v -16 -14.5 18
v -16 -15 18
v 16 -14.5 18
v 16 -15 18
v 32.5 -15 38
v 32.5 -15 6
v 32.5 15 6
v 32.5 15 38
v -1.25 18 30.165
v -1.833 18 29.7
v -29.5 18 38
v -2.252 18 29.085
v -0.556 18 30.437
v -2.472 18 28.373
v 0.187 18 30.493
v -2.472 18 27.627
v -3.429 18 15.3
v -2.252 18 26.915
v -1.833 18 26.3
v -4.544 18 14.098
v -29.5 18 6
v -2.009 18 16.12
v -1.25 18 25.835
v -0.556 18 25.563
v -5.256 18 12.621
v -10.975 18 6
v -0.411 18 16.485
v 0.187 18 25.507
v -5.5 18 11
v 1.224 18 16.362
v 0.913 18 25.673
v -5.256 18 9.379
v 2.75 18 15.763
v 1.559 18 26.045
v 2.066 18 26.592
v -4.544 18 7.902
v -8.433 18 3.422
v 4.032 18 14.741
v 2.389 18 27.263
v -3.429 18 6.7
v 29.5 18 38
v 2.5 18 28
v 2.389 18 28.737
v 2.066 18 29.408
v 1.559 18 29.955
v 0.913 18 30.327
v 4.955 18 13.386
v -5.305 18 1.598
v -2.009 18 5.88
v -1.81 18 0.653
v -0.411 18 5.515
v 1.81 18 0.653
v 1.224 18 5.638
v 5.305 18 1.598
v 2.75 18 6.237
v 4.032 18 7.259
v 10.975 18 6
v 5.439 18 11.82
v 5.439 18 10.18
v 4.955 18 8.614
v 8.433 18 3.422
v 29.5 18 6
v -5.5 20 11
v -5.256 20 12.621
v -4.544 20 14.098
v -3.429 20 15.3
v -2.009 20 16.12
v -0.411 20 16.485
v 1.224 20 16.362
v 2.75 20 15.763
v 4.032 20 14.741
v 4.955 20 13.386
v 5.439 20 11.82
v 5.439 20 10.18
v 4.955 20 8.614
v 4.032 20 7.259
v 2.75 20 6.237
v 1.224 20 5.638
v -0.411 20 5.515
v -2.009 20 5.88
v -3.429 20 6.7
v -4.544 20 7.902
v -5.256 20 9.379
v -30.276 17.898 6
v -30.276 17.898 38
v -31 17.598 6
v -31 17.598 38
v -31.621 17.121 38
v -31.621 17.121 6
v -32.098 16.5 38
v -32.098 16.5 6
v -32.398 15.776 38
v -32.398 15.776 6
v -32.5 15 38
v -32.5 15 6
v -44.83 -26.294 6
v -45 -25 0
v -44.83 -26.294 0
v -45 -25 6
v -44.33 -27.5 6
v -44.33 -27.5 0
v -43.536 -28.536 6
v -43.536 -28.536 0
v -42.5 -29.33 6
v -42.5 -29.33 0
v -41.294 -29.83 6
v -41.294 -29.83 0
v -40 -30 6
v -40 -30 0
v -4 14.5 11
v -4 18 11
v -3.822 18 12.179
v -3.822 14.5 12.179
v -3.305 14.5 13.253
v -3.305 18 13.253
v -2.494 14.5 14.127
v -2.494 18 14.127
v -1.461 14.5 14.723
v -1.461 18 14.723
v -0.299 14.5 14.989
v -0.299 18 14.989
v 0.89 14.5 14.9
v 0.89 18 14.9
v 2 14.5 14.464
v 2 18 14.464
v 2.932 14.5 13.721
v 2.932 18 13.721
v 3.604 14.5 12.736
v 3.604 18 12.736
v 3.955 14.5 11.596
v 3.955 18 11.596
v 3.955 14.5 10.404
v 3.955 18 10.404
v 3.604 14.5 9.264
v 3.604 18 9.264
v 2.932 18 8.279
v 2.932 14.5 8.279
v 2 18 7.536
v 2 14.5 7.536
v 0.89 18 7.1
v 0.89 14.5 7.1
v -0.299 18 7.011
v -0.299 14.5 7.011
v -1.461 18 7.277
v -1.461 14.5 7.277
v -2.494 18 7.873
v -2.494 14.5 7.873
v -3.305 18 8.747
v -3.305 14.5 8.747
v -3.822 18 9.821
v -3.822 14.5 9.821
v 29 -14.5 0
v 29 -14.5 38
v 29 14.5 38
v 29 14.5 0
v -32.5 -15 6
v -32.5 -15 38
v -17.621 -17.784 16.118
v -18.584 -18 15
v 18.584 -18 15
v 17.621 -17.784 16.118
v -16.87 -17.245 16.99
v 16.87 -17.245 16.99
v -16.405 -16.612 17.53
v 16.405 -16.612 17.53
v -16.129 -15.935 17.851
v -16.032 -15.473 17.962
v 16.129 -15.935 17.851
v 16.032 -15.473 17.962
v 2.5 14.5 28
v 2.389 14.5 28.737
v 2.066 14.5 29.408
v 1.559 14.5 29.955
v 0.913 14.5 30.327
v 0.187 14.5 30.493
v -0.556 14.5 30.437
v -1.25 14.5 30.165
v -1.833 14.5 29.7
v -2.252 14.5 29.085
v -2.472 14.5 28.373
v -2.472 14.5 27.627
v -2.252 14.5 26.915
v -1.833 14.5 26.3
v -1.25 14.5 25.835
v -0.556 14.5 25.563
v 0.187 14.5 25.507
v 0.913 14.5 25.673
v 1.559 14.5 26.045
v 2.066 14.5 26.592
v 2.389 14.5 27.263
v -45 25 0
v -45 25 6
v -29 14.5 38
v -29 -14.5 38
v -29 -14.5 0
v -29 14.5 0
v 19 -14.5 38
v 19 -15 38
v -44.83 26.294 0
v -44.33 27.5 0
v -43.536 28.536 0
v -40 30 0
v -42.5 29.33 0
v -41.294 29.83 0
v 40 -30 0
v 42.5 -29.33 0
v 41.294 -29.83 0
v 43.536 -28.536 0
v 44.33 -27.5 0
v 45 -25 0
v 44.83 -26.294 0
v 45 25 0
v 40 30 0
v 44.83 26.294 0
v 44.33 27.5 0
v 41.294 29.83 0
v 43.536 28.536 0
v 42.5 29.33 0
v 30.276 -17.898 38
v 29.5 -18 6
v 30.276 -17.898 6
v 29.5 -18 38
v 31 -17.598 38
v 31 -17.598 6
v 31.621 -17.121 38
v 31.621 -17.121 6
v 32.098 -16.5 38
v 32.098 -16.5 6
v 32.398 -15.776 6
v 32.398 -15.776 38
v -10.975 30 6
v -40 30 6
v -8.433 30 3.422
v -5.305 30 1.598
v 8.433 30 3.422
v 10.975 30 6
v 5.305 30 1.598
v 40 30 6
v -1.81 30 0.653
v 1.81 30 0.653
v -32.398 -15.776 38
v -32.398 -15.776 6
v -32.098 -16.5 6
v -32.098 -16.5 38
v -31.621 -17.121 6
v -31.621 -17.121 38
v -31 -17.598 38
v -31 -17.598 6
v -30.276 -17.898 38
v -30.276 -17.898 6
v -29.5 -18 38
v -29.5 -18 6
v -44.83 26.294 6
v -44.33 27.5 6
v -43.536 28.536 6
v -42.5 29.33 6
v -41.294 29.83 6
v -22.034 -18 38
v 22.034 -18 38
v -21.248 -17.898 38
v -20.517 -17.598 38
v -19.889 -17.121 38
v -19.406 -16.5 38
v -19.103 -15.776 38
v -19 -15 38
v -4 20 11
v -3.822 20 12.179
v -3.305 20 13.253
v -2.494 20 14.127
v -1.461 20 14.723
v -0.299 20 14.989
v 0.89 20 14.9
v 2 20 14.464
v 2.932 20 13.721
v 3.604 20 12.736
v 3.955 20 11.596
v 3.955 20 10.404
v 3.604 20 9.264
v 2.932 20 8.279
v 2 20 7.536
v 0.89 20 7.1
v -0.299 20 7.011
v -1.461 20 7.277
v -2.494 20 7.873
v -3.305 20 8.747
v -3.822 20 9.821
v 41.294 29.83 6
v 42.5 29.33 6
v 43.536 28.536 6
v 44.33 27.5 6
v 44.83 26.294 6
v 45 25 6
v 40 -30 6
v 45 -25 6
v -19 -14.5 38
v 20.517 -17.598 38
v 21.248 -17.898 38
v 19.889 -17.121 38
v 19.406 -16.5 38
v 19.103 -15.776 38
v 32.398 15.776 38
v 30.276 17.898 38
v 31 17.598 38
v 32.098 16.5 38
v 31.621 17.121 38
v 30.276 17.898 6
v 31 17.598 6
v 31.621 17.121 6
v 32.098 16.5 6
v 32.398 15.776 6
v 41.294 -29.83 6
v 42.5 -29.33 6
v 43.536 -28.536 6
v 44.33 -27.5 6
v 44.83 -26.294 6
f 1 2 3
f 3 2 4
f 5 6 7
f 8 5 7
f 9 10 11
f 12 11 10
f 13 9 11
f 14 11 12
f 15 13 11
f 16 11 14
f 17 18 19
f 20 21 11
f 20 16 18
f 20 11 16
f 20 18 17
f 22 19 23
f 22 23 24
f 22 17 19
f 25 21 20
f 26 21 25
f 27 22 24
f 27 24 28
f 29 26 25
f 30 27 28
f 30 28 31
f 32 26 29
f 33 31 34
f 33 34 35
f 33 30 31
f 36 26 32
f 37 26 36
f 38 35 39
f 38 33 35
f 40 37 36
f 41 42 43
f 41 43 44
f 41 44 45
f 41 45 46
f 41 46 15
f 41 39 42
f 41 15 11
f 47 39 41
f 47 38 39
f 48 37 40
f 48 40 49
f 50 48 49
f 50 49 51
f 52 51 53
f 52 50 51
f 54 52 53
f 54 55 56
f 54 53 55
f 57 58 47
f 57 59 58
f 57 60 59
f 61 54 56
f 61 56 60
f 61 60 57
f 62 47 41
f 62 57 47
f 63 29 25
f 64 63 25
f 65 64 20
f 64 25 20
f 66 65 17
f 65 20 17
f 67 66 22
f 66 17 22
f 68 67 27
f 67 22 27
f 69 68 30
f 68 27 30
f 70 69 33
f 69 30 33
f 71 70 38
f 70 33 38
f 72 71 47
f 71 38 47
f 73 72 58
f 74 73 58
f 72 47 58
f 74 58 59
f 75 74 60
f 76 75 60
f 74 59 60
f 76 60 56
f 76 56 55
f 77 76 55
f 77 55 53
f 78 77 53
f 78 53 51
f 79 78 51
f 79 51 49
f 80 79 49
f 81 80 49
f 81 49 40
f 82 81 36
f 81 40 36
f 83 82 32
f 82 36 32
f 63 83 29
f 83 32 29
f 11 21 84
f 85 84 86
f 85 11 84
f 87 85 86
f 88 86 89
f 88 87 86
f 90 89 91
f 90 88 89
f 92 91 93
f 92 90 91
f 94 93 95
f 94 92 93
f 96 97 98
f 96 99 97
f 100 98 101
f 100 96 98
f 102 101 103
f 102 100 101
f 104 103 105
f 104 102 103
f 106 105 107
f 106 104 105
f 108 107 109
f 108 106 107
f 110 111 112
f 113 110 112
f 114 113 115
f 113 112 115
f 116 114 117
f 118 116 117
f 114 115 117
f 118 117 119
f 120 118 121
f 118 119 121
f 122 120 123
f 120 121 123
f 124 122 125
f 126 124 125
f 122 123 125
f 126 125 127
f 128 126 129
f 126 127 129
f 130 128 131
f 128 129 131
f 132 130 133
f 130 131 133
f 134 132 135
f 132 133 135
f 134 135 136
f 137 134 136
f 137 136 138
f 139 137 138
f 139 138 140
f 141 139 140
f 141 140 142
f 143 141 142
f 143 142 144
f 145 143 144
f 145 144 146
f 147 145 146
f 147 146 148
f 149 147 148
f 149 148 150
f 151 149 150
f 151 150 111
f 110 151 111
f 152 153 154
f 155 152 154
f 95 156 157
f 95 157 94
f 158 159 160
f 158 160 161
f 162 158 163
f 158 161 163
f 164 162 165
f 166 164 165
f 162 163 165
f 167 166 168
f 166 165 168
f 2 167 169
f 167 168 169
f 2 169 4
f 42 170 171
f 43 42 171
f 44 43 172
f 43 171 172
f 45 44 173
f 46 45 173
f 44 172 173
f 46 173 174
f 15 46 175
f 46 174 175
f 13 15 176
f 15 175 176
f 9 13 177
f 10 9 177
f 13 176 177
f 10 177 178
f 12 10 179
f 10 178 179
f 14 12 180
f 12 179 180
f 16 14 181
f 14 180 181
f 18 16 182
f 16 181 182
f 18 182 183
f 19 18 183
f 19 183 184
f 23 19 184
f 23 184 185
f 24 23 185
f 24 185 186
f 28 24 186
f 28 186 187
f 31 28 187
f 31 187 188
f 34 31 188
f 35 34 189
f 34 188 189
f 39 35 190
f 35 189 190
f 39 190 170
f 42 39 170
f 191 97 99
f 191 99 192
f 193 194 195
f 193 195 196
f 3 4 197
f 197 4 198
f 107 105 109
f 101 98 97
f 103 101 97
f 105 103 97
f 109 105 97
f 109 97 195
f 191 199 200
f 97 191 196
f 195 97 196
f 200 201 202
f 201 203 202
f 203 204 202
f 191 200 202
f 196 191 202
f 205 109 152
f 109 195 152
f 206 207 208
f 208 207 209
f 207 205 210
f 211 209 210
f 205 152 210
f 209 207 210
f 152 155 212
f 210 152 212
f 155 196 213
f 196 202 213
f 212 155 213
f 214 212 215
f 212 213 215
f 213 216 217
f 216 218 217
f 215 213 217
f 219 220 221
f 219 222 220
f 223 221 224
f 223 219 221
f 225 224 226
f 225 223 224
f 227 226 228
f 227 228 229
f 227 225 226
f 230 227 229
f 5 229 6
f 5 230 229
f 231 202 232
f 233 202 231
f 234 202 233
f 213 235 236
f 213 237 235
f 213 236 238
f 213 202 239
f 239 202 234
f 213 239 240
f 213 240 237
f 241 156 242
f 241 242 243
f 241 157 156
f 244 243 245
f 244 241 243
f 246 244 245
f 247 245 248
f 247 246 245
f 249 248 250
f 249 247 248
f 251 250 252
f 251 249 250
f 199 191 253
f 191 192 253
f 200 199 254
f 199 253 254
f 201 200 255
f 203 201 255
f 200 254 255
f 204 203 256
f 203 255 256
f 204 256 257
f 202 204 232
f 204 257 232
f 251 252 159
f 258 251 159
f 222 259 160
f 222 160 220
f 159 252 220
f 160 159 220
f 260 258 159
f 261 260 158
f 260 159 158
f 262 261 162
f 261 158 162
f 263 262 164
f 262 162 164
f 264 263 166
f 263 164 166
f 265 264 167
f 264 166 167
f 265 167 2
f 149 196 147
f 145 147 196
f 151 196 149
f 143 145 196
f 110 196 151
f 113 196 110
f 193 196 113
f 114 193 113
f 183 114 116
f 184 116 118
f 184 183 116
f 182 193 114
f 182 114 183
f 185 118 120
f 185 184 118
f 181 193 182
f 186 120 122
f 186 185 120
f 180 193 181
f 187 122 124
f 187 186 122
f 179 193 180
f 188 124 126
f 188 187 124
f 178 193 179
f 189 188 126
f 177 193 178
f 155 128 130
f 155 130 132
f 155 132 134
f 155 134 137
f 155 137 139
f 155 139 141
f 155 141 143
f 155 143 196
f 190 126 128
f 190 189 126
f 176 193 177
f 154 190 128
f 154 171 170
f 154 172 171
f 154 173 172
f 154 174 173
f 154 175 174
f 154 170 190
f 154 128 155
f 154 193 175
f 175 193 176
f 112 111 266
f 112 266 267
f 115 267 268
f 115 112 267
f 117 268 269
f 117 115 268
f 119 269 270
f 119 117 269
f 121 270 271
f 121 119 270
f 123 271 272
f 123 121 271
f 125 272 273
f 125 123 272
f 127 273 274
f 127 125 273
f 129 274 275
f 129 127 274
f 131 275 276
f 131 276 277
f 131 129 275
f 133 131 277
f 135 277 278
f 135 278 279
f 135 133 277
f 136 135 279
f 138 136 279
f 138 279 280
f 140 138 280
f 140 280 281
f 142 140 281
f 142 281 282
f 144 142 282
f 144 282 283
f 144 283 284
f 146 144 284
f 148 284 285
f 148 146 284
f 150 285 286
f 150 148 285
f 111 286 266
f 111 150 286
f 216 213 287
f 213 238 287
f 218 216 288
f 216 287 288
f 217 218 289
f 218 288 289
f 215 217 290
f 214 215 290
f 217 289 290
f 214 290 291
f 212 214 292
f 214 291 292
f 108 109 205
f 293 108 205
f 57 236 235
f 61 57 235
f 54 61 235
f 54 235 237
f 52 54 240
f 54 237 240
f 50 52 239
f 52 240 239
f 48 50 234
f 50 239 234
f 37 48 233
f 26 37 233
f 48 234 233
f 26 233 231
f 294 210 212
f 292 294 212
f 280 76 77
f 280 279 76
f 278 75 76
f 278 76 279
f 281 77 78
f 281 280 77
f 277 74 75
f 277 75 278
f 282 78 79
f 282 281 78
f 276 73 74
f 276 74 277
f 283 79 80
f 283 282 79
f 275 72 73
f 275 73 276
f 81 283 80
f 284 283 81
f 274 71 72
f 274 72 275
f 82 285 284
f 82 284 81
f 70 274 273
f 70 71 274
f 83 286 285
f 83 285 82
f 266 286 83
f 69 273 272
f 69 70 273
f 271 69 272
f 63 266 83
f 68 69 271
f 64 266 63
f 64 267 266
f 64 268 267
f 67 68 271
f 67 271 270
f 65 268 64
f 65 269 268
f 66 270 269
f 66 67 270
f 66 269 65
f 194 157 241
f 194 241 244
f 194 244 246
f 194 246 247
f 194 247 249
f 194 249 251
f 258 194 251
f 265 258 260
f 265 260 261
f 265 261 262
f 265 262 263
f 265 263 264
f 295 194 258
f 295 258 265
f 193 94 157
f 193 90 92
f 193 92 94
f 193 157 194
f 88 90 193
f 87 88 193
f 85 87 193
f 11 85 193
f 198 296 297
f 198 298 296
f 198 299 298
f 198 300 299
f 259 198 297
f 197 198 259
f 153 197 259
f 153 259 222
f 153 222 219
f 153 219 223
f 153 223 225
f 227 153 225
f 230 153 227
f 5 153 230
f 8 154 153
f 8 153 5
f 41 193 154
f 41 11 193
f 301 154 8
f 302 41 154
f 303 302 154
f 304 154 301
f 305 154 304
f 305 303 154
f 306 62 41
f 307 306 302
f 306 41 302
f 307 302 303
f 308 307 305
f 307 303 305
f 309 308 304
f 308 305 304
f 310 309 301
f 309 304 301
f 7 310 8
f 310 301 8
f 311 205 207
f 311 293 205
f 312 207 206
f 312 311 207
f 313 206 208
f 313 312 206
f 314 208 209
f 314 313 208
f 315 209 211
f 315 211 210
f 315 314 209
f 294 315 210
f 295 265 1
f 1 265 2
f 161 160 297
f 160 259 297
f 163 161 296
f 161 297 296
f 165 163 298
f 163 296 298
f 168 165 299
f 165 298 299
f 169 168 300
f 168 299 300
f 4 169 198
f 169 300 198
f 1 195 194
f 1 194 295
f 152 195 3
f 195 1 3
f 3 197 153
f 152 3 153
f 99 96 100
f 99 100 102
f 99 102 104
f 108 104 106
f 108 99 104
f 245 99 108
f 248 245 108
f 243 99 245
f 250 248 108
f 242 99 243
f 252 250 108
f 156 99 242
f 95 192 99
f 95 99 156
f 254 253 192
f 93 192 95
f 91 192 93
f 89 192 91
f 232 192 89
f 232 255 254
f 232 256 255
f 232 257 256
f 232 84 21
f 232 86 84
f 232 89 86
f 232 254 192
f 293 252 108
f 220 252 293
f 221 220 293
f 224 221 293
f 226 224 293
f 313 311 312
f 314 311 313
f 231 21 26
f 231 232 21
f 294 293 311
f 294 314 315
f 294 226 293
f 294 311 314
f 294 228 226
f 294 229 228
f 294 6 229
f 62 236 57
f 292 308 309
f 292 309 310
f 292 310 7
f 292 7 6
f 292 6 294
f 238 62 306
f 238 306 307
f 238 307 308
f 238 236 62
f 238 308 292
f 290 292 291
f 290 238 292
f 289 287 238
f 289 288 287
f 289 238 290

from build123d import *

# Parameters (mm, degrees)
F0_W      = 90
F0_H      = 60
F1_DEPTH  = 6
F2_W      = 65
F2_H      = 36
F3_DEPTH  = 32
F4_W      = 58
F4_H      = 29
F5_DEPTH  = 38
F7_DEPTH  = 3.5
F8_R      = 2.5
F9_DEPTH  = 3.5
F11_DEPTH = 12
F12_R     = 5.5
F12_R_2   = 4
F13_DEPTH = 2
F14_DEPTH = 25
F15_R     = 5
F16_R     = 3


with BuildPart() as f1:
    # F0 (on Top) → F1 (new body)
    with BuildSketch(Plane.XY):
        Rectangle(F0_W, F0_H)
    extrude(amount=F1_DEPTH)

    # F2 (on face) → F3 (join)
    with BuildSketch(Plane.XY.offset(6)):
        Rectangle(F2_W, F2_H)
    extrude(amount=F3_DEPTH)

    # F4 (on face) → F5 (cut, through all)
    with BuildSketch(Plane.XY.offset(38)):
        Rectangle(F4_W, F4_H)
    extrude(amount=-F5_DEPTH, mode=Mode.SUBTRACT)

    # F6 (on face) → F7 (cut, through all)
    with BuildSketch(Plane.XZ.offset(18)):
        Polygon((19, 38), (-19, 38), (-16, 18), (0, 18), (16, 18), align=None)
    extrude(amount=-F7_DEPTH, mode=Mode.SUBTRACT)

    # F8 (on face) → F9 (cut, through all)
    with BuildSketch(Plane.XZ.offset(-14.5)):
        with Locations((0, 28)):
            Circle(F8_R)
    extrude(amount=-F9_DEPTH, mode=Mode.SUBTRACT)

    # F10 (on face) → F11 (cut, through all)
    with BuildSketch(Plane(origin=(0, 30, 0), x_dir=(-1, 0, 0), z_dir=(0, 1, 0))):
        with BuildLine():
            Line((10.9752045511, 6), (-10.9752045511, 6))
            ThreePointArc((-10.9752045511, 6), (0, 0.532957507), (10.9752045511, 6))
        make_face()
    extrude(amount=-F11_DEPTH, mode=Mode.SUBTRACT)

    # F12 (on face) → F13 (join)
    with BuildSketch(Plane(origin=(0, 18, 0), x_dir=(-1, 0, 0), z_dir=(0, 1, 0))):
        with Locations((0, 11)):
            Circle(F12_R)
        with Locations((0, 11)):
            Circle(F12_R_2, mode=Mode.SUBTRACT)
    extrude(amount=F13_DEPTH)

    # F14 (cut): a face of the model
    f14_faces = [f1.faces().sort_by_distance(p)[0] for p in [
        (0, 18, 11),
    ]]
    extrude(f14_faces, amount=-F14_DEPTH, mode=Mode.SUBTRACT)

    # F15
    f15_edges = [f1.edges().sort_by_distance(p)[0] for p in [
        (45, -30, 3),
        (45, 30, 3),
        (-45, -30, 3),
        (-45, 30, 3),
    ]]
    fillet(f15_edges, radius=F15_R)

    # F16
    f16_edges = [f1.edges().sort_by_distance(p)[0] for p in [
        (-32.5, 18, 22),
        (-32.5, -18, 22),
        (32.5, 18, 22),
        (32.5, -18, 22),
        (-17.5, -18, 28),
        (17.5, -18, 28),
        (0, -18, 18),
    ]]
    fillet(f16_edges, radius=F16_R)


solid = f1.part
